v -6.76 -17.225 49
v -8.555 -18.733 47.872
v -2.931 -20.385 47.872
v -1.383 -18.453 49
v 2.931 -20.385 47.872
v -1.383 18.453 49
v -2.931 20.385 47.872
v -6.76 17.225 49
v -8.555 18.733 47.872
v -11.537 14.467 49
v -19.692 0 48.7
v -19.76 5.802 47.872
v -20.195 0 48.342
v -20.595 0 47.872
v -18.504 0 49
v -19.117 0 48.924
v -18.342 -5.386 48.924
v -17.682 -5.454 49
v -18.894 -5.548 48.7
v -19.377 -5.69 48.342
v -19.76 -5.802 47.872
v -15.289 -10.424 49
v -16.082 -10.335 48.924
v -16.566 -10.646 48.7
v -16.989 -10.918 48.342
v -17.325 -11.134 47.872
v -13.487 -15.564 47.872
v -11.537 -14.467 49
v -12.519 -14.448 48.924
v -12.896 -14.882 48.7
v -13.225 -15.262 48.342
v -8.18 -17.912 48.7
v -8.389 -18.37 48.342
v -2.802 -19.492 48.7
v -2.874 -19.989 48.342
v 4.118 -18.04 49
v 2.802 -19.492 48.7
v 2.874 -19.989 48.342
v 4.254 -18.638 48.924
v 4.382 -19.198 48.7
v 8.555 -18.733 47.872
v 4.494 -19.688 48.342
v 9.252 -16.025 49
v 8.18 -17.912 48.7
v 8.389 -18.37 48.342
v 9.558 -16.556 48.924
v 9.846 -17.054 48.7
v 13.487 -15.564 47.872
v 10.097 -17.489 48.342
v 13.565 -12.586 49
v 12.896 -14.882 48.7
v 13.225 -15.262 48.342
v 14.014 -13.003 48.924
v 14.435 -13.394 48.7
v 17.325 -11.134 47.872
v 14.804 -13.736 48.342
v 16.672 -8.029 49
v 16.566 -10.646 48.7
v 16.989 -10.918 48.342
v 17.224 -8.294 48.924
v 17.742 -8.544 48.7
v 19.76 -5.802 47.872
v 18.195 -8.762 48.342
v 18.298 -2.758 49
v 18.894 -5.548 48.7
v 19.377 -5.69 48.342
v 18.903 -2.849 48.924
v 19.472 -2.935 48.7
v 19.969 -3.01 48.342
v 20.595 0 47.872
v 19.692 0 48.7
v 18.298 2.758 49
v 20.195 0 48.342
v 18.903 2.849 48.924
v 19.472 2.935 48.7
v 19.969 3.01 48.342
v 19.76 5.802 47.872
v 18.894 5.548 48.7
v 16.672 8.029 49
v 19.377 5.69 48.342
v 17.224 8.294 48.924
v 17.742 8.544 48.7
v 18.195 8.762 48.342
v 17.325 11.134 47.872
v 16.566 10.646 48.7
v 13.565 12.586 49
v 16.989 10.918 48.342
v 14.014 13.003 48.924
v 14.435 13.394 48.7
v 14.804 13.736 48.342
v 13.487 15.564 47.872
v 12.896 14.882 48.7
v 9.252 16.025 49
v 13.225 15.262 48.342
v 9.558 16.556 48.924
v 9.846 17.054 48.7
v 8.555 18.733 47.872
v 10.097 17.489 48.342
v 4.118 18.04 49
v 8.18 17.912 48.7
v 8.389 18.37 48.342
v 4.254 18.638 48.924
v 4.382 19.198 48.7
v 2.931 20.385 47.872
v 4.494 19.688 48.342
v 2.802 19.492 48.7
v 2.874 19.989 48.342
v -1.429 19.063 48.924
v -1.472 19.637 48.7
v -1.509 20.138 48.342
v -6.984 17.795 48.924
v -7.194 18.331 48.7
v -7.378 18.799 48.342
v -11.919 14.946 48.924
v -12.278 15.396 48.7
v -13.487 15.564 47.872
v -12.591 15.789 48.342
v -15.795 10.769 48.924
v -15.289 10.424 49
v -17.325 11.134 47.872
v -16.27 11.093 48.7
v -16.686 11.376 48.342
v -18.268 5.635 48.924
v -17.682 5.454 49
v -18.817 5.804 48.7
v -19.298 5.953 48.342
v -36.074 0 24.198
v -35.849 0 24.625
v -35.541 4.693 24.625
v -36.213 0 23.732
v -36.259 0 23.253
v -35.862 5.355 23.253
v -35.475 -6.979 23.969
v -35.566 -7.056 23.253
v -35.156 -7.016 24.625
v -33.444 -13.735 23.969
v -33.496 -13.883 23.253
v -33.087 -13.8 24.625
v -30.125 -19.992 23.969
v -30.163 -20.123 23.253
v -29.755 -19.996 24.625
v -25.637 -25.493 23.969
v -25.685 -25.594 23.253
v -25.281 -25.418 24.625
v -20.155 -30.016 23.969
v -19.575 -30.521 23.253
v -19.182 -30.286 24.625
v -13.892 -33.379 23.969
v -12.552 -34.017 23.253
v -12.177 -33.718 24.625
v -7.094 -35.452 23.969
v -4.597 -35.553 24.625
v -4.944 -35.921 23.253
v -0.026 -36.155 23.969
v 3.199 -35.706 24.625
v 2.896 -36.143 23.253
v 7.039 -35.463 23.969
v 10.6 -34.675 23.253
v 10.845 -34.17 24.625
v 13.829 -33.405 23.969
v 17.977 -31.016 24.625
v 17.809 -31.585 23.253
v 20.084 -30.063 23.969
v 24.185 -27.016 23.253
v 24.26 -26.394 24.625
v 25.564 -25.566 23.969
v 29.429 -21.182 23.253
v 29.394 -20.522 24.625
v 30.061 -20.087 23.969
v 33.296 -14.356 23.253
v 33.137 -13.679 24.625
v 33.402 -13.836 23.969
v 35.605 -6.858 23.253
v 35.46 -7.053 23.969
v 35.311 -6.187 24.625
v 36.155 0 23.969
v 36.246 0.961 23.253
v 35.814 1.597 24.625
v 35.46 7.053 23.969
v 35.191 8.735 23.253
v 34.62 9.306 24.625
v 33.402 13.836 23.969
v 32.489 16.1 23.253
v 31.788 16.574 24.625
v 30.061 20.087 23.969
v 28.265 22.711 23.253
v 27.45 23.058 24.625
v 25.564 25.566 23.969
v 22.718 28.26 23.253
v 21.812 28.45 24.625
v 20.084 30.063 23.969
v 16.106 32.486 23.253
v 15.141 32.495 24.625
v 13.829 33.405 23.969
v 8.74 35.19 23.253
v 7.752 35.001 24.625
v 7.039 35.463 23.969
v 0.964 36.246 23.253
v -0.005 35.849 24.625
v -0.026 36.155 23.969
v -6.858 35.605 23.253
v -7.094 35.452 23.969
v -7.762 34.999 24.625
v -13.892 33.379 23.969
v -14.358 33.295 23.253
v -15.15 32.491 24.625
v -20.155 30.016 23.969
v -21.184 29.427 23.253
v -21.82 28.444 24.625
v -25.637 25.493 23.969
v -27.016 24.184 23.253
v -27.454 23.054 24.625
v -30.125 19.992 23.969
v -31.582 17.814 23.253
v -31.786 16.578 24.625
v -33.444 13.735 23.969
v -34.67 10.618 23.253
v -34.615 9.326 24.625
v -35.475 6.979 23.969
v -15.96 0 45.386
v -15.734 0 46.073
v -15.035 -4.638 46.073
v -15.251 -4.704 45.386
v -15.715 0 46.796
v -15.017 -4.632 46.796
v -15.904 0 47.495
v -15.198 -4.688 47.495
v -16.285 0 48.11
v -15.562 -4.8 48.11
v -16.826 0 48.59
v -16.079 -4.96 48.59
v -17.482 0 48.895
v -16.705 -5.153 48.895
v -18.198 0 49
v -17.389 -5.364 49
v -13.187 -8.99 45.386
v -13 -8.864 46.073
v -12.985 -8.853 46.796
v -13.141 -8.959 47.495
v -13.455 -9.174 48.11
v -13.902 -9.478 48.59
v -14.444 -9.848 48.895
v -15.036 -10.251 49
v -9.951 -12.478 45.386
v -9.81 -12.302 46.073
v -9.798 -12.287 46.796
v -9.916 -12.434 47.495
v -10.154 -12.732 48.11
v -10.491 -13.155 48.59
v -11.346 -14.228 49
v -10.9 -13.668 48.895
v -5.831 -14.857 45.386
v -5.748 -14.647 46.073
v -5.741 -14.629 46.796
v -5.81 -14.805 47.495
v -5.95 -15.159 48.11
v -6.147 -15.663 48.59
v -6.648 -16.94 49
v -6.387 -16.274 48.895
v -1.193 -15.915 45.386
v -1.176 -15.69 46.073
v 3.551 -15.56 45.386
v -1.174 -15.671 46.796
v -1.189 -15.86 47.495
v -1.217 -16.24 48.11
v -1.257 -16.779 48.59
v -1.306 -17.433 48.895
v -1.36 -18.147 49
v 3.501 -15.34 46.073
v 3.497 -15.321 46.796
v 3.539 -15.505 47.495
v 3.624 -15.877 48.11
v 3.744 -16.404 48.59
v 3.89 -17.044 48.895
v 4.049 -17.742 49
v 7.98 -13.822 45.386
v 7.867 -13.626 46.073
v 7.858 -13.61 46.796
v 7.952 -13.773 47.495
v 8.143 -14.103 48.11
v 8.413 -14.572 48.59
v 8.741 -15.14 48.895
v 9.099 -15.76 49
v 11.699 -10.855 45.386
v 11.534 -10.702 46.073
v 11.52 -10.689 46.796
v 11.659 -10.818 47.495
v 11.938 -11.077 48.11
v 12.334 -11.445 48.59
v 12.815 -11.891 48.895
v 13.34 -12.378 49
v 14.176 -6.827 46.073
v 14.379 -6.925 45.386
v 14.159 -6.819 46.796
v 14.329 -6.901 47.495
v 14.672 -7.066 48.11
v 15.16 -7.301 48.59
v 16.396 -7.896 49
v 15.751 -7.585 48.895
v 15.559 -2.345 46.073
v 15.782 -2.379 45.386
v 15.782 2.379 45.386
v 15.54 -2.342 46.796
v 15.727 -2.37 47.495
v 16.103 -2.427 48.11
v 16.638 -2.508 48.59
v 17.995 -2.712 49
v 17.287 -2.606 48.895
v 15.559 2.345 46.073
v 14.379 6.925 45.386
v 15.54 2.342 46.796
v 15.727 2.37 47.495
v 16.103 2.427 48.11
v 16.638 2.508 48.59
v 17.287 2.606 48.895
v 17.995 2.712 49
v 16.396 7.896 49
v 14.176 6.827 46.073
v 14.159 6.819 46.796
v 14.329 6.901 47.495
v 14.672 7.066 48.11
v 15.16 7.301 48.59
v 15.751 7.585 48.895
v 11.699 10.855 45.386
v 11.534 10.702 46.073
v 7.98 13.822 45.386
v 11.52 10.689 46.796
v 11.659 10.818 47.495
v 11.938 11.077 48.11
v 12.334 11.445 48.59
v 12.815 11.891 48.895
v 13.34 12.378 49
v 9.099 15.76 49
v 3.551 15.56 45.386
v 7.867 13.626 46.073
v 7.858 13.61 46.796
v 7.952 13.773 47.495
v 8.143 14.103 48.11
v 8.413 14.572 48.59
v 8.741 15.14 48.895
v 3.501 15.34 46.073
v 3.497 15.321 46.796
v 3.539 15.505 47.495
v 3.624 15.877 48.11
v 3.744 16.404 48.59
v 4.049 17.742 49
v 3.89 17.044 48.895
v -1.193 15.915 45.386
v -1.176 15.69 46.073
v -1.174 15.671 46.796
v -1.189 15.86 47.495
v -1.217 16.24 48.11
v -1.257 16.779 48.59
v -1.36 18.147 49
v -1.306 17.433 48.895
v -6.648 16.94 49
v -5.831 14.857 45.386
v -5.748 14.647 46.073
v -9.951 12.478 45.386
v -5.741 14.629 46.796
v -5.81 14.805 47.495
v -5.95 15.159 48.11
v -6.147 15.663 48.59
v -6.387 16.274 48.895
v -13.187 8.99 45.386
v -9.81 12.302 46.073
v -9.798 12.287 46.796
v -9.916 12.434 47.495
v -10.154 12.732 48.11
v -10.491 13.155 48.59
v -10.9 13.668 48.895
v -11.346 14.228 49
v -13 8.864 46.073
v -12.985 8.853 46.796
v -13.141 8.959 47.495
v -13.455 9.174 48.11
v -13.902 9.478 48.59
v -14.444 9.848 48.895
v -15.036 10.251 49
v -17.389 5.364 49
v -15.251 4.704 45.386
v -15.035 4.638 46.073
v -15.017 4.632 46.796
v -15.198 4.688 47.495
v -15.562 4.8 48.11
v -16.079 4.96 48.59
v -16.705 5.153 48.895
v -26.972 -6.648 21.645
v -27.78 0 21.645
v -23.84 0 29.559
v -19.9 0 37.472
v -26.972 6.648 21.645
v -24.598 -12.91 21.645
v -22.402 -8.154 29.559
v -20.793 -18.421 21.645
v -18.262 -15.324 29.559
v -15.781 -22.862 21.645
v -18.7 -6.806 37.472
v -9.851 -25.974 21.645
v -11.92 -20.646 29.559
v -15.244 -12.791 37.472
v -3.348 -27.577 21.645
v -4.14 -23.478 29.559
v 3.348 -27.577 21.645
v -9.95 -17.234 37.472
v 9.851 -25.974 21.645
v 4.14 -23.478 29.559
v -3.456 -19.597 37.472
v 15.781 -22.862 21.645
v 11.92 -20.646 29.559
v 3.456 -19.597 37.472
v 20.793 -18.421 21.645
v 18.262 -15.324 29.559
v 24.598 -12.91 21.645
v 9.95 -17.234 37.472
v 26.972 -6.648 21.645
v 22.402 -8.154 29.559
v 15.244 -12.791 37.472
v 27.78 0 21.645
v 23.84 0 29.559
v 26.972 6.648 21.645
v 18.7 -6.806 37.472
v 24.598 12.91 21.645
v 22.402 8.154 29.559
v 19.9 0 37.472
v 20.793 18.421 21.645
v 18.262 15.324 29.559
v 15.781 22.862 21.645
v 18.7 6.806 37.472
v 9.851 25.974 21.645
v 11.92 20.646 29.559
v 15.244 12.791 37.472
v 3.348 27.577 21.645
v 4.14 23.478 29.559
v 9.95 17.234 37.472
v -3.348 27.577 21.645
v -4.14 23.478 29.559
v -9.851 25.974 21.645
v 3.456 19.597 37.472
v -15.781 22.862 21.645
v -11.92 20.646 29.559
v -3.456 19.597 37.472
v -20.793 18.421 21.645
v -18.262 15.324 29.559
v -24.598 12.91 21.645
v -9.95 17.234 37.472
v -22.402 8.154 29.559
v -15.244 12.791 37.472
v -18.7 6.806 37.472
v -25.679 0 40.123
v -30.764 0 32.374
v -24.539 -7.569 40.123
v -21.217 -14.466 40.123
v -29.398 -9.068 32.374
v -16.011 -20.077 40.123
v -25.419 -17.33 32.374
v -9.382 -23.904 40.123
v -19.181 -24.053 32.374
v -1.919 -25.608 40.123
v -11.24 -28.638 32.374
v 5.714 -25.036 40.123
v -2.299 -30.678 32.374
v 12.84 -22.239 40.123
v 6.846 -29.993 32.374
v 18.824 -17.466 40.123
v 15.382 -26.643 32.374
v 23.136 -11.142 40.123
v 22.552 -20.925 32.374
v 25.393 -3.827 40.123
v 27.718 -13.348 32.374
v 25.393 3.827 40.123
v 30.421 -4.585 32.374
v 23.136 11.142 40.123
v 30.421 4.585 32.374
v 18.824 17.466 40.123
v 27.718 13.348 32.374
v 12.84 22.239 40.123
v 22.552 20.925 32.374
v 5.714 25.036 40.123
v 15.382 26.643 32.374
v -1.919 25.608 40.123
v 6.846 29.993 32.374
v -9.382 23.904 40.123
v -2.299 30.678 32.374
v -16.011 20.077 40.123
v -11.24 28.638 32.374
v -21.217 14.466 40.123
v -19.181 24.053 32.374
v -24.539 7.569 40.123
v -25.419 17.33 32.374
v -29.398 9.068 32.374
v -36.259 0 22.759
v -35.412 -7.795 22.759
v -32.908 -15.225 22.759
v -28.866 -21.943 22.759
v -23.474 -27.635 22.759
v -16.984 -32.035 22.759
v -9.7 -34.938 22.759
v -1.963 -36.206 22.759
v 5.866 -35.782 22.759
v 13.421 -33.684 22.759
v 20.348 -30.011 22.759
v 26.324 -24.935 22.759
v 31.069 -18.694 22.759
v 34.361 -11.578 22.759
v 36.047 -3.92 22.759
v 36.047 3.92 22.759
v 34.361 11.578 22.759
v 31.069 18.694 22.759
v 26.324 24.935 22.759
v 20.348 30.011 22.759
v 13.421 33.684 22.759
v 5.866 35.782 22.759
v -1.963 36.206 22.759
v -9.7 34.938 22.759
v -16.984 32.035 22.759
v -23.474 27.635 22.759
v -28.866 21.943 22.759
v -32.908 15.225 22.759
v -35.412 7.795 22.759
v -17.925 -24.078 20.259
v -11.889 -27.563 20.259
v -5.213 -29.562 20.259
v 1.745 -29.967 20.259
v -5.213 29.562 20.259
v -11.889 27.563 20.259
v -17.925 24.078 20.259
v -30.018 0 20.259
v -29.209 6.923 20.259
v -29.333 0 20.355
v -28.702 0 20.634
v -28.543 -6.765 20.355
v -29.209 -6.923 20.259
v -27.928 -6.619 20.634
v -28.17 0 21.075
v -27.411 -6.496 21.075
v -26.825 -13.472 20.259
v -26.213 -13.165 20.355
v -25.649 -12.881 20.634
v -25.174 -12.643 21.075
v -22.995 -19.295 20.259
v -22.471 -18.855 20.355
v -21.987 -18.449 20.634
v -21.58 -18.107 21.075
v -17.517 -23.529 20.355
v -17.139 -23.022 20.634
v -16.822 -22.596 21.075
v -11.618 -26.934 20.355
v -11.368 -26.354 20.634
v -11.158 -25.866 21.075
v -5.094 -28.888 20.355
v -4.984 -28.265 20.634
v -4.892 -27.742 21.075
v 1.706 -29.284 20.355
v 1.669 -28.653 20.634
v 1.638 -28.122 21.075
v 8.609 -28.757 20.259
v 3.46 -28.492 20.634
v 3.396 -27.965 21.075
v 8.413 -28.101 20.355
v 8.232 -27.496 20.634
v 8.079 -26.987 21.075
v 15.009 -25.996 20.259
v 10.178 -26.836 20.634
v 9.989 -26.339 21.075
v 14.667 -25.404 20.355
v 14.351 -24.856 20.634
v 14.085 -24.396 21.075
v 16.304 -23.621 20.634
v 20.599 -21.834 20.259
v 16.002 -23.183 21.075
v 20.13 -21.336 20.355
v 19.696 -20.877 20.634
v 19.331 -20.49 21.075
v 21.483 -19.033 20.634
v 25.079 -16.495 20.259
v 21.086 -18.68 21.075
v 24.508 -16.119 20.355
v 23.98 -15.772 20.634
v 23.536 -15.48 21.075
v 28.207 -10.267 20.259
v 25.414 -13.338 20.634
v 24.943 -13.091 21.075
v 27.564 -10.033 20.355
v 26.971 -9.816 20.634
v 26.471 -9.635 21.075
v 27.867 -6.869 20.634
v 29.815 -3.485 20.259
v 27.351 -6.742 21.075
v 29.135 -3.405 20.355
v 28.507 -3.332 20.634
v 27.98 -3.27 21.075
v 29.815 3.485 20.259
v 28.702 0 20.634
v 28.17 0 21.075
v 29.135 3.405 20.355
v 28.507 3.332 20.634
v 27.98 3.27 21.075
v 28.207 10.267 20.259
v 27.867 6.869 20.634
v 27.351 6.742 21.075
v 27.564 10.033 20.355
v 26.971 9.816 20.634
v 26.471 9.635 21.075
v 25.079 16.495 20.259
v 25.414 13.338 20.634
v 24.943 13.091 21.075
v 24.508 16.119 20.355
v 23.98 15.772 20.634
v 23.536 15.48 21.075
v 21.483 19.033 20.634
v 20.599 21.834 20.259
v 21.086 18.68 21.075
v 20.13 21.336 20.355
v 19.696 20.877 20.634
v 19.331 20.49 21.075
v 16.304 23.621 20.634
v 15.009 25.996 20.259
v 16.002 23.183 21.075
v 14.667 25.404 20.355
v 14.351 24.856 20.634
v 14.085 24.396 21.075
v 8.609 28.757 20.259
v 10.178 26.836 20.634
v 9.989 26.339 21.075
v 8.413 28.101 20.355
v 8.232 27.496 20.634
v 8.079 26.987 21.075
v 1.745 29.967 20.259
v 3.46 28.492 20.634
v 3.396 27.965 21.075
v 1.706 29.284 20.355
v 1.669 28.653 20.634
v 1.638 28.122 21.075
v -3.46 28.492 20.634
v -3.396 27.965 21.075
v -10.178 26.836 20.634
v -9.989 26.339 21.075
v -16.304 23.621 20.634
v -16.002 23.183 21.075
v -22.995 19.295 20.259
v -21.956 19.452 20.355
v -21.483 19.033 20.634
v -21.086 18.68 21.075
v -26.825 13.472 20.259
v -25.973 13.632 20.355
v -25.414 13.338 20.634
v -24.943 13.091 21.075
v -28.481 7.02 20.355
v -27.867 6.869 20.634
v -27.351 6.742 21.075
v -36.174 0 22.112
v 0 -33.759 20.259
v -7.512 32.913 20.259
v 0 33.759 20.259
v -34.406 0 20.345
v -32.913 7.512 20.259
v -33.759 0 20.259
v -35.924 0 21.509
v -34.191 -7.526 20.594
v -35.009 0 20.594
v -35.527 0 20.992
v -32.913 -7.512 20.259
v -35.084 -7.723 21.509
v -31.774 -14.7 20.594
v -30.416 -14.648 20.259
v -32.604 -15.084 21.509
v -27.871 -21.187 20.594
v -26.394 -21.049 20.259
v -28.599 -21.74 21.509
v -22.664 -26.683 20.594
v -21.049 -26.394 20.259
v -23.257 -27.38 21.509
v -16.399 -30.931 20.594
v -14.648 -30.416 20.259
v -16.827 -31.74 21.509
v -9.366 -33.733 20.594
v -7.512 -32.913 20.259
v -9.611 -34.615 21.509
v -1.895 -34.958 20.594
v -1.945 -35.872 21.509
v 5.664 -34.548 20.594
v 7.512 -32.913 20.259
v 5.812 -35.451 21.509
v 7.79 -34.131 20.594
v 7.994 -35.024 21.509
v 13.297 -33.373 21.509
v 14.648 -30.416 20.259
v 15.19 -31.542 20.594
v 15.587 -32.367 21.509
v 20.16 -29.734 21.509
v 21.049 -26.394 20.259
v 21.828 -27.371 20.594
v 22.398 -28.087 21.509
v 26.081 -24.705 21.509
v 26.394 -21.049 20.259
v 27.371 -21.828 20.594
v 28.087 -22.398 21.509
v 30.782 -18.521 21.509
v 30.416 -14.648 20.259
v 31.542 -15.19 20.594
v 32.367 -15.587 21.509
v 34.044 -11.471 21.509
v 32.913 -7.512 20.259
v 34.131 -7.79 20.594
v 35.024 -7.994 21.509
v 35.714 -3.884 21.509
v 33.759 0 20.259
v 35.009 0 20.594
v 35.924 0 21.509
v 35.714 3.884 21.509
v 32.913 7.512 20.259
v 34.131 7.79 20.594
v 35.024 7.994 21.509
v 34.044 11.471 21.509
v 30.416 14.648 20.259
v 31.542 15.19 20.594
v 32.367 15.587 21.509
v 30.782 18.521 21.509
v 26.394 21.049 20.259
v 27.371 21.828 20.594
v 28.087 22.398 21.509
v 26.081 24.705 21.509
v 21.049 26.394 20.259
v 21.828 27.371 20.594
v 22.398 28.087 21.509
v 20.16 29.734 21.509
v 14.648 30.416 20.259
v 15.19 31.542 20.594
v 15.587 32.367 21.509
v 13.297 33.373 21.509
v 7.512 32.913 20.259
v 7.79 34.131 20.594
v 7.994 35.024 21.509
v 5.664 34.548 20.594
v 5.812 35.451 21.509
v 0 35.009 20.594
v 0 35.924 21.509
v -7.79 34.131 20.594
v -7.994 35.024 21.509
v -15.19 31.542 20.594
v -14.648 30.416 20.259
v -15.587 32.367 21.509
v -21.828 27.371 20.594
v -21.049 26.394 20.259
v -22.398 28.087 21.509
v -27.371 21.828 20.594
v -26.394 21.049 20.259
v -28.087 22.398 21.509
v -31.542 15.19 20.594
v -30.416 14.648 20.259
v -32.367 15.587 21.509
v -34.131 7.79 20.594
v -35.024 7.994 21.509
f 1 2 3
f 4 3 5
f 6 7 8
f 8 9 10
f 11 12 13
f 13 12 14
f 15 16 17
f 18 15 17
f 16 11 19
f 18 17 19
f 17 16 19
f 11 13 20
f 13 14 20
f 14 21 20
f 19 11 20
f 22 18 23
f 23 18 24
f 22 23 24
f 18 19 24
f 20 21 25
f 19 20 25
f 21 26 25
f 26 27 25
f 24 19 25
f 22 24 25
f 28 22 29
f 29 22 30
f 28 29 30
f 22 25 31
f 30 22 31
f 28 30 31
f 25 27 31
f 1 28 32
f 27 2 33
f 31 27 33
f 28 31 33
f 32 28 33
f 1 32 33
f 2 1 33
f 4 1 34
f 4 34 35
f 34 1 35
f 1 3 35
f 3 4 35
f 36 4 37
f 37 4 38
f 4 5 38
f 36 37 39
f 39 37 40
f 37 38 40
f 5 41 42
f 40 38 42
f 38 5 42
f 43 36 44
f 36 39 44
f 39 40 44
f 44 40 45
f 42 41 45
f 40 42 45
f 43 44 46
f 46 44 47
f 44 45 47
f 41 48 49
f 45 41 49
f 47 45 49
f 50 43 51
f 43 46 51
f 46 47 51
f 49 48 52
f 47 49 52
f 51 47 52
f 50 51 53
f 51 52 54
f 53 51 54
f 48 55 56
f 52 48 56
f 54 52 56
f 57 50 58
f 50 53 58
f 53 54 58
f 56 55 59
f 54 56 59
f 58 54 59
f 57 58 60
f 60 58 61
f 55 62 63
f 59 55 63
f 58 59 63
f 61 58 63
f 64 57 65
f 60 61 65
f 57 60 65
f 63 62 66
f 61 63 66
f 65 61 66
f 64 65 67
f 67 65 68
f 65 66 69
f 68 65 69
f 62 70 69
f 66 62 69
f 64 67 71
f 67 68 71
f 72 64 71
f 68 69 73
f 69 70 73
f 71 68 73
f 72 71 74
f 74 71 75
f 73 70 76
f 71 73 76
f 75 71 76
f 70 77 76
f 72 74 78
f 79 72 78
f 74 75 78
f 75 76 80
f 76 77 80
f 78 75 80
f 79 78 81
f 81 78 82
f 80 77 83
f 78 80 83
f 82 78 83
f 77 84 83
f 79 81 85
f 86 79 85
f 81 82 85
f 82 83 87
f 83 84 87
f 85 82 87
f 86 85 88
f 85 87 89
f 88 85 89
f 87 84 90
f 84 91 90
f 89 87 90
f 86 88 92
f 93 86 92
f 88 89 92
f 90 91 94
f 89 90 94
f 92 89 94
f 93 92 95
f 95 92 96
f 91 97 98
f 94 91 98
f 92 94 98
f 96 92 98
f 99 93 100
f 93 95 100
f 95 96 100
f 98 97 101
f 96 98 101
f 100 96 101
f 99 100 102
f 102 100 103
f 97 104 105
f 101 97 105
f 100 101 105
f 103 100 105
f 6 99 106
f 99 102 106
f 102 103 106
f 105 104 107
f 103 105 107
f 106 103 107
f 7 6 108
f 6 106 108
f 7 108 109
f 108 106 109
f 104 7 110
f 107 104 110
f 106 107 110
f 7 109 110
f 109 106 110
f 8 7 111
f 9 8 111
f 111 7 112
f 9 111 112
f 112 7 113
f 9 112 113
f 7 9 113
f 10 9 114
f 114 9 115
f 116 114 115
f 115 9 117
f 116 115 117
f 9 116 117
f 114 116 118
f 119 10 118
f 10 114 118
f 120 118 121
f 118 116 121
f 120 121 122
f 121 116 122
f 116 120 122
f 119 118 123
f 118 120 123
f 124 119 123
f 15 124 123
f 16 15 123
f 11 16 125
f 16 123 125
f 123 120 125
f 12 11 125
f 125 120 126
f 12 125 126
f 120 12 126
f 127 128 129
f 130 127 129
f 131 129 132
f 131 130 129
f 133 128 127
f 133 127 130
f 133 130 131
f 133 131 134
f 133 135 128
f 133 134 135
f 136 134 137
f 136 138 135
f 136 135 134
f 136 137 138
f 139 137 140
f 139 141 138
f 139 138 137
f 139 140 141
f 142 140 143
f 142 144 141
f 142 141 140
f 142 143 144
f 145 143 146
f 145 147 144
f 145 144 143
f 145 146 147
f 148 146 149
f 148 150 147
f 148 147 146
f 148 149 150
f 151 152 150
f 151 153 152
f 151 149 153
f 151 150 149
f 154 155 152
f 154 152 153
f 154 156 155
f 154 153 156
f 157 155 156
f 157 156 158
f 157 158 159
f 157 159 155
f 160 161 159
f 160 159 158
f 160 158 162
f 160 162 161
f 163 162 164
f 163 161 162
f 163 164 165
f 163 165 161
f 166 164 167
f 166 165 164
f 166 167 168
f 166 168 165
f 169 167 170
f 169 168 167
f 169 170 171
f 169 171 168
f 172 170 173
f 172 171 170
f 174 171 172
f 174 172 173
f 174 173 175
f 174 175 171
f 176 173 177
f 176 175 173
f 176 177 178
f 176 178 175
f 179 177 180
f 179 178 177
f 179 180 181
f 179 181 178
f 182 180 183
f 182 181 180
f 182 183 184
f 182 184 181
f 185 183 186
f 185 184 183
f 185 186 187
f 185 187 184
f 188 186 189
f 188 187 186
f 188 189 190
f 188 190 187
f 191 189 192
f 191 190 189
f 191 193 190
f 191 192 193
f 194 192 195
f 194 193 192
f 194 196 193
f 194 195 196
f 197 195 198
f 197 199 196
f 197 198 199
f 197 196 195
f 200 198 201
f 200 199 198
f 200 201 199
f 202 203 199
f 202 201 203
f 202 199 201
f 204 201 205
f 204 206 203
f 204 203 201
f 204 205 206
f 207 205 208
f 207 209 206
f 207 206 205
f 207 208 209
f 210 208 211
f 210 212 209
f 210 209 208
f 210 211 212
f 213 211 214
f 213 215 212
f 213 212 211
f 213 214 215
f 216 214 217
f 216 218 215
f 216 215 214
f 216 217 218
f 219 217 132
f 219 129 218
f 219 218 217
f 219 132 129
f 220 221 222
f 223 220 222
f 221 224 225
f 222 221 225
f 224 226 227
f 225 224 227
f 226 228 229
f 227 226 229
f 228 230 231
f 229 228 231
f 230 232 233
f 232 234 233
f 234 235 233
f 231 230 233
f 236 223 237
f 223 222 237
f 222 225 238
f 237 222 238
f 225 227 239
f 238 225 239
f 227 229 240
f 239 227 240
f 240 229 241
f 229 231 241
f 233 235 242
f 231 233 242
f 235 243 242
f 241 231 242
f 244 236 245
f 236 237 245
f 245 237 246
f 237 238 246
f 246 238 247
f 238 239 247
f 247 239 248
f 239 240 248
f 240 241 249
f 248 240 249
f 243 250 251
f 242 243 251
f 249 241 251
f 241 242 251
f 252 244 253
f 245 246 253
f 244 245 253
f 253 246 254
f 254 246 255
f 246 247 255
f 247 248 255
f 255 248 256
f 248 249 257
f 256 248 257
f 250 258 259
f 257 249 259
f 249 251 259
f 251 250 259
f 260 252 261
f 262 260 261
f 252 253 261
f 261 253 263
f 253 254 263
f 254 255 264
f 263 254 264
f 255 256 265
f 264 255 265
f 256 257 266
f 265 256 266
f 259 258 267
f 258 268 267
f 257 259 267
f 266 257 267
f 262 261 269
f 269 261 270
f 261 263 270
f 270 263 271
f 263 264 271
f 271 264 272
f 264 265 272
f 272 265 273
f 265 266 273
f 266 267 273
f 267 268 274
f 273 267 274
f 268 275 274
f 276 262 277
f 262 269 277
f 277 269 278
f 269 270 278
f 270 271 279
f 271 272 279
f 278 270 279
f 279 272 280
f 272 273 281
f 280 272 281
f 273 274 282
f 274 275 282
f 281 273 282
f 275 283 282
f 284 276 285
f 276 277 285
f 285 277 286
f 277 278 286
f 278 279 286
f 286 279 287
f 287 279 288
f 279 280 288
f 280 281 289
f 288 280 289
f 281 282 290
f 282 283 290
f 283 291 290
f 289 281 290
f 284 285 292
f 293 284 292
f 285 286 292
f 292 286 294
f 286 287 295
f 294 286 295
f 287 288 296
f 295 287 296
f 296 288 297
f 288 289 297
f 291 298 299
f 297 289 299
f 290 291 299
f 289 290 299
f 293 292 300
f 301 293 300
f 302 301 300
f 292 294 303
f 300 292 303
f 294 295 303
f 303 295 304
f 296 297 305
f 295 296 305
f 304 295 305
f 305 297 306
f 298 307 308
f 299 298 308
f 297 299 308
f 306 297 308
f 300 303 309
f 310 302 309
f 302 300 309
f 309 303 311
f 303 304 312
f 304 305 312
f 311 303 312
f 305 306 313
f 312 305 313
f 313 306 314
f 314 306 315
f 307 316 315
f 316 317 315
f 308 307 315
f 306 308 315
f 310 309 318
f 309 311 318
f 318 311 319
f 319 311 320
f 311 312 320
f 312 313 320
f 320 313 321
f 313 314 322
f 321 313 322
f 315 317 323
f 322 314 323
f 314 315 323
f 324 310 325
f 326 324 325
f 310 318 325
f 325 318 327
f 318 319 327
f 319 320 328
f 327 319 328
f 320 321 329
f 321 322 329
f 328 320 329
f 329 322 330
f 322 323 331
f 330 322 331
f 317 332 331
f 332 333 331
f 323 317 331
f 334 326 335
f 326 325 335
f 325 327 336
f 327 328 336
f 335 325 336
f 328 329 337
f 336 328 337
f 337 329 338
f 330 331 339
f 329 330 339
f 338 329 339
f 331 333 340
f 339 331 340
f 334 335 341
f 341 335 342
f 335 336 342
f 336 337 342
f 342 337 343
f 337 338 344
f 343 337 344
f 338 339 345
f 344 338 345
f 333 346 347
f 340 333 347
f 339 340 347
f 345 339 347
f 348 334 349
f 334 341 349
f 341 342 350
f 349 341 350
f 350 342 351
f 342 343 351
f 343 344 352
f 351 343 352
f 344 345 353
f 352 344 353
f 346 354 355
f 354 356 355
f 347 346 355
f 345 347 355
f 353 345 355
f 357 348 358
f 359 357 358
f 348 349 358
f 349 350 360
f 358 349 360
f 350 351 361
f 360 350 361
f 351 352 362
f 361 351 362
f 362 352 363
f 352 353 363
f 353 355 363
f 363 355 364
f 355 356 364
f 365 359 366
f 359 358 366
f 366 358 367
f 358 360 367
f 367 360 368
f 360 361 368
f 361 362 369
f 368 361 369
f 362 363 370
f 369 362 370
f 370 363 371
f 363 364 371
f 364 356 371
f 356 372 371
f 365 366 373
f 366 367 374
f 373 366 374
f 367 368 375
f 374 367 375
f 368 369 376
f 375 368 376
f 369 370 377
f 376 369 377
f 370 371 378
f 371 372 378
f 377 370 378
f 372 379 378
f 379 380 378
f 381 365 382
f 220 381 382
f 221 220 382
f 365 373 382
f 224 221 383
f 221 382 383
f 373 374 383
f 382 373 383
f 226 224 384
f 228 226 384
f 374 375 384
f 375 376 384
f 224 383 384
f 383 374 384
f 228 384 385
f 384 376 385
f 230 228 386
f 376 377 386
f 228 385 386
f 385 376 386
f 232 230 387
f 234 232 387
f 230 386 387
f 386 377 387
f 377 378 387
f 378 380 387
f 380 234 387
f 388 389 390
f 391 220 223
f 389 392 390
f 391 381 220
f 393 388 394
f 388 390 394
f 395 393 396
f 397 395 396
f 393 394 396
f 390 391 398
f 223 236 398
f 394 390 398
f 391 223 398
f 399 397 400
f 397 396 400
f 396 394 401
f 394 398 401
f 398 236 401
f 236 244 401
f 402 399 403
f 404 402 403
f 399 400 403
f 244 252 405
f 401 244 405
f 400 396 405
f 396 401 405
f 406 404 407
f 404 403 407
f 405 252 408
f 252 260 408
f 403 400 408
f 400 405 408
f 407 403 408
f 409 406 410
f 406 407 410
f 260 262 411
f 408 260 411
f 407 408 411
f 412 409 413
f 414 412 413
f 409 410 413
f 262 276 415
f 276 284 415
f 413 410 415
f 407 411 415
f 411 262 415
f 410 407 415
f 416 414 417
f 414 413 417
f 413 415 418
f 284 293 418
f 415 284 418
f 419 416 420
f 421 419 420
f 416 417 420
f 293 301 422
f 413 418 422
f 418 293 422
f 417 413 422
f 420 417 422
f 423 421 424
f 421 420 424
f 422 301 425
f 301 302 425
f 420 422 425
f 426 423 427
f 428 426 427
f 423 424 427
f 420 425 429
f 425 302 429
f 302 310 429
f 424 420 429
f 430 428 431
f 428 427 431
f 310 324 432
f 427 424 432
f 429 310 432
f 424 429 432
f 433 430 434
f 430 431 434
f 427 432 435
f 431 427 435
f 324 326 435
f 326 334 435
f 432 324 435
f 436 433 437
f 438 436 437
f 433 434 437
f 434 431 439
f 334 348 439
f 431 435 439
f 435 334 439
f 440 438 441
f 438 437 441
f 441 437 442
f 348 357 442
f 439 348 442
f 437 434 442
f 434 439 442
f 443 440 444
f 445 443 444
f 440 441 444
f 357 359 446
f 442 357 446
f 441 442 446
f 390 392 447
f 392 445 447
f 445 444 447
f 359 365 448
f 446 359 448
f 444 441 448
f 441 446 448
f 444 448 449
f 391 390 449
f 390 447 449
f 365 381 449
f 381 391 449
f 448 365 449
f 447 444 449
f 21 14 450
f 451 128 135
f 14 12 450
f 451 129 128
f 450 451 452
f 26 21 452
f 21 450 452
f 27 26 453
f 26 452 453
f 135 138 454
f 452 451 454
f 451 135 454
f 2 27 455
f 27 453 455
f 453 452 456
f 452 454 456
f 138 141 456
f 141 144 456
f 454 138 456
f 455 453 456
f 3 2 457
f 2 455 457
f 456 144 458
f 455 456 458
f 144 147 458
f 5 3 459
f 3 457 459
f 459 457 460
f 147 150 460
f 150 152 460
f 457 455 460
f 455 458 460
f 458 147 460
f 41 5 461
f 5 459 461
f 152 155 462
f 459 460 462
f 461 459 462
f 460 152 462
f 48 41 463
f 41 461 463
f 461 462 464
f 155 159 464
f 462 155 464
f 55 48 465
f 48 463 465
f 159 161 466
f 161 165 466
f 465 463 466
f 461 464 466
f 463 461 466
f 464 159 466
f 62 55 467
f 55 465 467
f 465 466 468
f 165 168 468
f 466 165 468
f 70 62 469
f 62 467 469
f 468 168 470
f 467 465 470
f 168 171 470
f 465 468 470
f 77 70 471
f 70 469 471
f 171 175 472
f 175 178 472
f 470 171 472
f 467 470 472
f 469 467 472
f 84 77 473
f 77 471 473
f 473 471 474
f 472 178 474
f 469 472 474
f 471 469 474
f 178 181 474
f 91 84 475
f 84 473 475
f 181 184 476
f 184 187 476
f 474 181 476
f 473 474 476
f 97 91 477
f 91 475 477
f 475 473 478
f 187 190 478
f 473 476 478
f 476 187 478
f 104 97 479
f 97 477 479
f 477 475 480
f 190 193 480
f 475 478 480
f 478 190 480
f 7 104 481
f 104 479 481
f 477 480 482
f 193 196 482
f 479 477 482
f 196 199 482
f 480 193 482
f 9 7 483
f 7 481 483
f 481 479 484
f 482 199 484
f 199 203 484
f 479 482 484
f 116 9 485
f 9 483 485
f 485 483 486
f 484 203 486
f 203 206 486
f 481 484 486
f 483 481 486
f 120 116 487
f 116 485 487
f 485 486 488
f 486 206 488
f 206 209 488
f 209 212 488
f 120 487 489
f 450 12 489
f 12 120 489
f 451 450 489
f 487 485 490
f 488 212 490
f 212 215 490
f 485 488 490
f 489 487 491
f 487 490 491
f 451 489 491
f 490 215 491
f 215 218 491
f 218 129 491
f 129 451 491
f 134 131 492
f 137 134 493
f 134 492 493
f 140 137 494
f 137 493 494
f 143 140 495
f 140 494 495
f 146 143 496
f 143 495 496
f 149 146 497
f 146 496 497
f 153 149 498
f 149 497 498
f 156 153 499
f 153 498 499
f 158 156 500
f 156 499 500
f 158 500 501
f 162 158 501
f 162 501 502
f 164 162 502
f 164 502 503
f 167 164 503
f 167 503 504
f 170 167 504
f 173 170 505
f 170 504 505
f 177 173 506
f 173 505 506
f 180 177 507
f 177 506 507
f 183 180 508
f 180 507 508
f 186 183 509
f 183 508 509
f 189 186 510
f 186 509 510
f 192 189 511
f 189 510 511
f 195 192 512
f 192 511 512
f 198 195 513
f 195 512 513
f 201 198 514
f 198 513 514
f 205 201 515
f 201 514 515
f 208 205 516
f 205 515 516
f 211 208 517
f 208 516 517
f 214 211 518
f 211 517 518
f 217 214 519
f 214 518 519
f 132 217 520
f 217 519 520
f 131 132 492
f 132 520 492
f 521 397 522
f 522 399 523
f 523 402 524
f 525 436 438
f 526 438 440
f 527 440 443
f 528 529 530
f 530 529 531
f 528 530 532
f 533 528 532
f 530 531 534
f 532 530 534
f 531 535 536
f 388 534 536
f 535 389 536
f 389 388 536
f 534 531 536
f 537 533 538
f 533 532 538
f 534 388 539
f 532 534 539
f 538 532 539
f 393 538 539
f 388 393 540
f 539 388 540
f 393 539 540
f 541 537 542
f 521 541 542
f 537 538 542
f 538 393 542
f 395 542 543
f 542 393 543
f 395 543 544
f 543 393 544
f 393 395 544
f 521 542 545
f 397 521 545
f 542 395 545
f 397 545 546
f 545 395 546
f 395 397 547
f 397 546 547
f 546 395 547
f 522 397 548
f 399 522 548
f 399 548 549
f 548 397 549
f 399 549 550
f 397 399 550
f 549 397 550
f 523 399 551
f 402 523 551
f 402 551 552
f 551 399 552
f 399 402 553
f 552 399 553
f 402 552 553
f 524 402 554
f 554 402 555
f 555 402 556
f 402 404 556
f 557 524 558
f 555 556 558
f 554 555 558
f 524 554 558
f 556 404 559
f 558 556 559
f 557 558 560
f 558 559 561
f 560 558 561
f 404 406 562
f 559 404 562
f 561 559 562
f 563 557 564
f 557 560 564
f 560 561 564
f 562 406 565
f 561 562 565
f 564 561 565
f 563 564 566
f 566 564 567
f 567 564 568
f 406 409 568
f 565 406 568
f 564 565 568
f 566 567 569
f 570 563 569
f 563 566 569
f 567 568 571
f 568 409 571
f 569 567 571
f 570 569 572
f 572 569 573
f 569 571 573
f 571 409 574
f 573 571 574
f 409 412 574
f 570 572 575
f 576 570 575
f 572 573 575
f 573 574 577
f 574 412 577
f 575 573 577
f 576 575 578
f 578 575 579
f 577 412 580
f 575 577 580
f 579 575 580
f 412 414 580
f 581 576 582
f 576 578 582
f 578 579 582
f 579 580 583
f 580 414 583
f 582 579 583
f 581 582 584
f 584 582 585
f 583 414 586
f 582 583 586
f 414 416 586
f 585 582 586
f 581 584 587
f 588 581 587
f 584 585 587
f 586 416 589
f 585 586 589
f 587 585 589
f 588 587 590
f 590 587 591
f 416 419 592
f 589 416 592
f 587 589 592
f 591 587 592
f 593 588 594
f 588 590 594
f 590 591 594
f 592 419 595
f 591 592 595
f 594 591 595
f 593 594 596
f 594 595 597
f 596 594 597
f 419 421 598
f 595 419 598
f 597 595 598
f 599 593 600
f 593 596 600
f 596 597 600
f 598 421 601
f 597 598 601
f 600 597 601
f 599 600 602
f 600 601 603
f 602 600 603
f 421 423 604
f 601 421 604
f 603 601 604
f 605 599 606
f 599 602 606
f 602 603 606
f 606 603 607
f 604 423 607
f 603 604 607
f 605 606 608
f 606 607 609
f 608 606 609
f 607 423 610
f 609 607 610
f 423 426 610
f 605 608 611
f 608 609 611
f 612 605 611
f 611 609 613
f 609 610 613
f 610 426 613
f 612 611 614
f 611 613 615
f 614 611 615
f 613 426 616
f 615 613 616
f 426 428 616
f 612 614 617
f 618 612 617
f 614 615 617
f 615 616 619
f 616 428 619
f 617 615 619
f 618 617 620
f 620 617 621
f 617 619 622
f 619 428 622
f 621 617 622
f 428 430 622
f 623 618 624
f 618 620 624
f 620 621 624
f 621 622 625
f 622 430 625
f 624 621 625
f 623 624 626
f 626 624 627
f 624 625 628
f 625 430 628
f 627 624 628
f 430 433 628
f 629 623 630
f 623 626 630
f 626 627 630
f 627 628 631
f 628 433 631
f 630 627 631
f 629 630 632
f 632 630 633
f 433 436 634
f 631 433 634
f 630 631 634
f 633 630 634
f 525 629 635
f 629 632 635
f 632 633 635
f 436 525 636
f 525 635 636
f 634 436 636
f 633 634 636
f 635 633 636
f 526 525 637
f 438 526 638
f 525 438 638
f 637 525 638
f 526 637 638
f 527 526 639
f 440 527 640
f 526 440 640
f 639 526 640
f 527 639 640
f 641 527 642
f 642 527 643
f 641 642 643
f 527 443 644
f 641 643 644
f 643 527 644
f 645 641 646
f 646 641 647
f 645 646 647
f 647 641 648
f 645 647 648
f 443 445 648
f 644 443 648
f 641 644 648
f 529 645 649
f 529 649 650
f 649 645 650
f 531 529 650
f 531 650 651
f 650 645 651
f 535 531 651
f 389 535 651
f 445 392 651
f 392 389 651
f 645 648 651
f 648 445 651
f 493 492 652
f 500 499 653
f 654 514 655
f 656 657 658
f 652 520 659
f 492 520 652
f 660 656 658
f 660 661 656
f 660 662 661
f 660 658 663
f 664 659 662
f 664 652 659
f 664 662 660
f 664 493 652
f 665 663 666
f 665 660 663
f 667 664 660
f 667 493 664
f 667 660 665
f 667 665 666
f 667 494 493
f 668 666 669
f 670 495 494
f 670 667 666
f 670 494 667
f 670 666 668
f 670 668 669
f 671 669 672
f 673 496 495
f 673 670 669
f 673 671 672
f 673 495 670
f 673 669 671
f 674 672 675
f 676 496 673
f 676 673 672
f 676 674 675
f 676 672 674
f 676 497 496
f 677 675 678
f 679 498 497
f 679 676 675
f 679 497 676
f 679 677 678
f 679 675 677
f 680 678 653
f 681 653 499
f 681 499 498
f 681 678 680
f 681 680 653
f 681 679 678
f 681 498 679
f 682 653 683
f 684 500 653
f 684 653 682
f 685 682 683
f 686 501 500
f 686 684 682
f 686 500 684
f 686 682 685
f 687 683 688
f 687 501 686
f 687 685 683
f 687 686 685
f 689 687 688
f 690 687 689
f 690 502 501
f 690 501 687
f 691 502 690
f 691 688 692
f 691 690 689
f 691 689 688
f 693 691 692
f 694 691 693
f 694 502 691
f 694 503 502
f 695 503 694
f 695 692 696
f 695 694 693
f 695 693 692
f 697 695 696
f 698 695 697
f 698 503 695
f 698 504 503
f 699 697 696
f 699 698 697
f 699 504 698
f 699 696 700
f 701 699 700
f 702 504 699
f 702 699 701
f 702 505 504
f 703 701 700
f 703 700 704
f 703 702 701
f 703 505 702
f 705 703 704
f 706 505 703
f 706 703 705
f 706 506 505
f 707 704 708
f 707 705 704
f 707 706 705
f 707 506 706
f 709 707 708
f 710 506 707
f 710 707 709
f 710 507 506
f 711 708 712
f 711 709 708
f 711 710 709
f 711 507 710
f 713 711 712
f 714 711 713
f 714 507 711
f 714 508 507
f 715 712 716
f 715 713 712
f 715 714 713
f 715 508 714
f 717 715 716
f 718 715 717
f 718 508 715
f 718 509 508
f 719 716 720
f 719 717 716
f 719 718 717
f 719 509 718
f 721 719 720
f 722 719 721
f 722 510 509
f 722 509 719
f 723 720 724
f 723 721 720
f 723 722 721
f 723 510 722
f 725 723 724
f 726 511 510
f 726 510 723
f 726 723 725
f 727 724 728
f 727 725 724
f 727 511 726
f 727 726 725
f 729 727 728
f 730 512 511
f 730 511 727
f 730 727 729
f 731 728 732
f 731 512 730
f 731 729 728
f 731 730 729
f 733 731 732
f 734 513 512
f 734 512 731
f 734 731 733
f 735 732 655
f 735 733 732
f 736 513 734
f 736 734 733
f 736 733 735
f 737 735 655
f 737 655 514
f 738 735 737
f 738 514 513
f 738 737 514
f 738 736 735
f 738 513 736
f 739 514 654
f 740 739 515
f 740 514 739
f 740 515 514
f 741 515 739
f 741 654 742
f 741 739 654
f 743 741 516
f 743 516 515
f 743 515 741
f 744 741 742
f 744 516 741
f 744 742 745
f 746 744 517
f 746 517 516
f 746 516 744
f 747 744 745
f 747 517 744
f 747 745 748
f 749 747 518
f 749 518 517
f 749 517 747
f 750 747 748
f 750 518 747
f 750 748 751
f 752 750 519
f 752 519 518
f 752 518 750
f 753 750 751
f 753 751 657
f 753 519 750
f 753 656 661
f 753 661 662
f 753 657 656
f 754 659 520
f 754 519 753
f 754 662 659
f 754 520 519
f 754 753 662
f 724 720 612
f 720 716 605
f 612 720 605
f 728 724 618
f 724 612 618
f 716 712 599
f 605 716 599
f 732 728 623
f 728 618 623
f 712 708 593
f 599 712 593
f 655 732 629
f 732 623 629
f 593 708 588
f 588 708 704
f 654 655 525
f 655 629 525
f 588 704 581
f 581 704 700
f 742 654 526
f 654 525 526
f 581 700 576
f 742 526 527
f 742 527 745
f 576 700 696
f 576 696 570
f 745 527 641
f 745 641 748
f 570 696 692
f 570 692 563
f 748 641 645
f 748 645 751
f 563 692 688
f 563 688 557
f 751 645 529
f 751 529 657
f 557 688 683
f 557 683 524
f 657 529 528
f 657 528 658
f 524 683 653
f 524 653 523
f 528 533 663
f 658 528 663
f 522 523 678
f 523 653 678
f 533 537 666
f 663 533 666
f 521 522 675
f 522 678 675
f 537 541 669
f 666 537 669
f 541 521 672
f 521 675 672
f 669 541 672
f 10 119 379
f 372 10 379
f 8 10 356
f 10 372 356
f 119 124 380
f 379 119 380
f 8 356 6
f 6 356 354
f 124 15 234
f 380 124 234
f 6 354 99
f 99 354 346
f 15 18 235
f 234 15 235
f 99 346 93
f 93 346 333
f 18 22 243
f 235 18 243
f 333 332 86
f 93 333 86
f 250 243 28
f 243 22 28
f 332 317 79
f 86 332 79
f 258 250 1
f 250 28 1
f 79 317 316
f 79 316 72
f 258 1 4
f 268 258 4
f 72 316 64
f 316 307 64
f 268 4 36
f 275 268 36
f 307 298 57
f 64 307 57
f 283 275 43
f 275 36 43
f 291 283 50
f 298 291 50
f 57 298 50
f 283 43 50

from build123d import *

# Parameters (mm, degrees)
F5_R = 2.5


# Not quite as in the source:
# - the program builds the solid bodies; features that only make, move or delete a surface that nothing else refers to are left out


with BuildPart() as f4:
    # F3 (on Front) → F4 (revolve)
    with BuildSketch(Plane.XZ):
        Polygon((-36.259230652, 20.2593781938), (-28.4696114573, 20.2593781938), (-14.1603897064, 49), (-19.8540338413, 49), (-36.259230652, 24), align=None)
    revolve(axis=Axis((0, 0, 18.828805536), (0, 0, 1)))

    # F5
    f5_edges = [f4.edges().sort_by_distance(p)[0] for p in [
        (19.854034, 0, 49),
        (14.16039, 0, 49),
        (36.259231, 0, 24),
        (36.259231, 0, 20.259378),
        (28.469611, 0, 20.259378),
    ]]
    fillet(f5_edges, radius=F5_R)


solid = f4.part
